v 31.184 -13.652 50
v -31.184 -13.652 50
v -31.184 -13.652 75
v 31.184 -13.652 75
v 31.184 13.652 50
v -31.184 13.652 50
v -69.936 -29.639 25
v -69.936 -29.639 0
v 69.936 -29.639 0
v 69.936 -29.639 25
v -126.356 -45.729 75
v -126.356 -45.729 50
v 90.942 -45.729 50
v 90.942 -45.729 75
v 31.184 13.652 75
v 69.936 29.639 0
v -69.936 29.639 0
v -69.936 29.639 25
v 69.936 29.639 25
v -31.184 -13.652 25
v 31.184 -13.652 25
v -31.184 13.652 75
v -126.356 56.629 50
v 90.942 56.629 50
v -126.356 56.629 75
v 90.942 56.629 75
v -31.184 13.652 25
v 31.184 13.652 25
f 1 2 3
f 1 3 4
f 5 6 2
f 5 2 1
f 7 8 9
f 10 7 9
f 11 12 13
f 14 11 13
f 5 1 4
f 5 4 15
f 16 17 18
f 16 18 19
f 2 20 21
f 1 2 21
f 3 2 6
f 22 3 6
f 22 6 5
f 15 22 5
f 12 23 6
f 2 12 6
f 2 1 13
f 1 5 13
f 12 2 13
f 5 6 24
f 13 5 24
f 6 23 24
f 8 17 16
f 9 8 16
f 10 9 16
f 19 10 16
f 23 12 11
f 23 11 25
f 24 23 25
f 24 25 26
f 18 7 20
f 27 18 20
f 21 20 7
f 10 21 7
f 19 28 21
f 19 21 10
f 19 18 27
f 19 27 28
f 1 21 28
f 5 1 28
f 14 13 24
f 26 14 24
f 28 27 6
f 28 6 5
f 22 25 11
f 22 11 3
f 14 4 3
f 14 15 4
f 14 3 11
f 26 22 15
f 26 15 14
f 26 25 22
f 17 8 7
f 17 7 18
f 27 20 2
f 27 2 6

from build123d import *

# Parameters (mm, degrees)
F0_W     = 139.871492
F0_H     = 59.277482
F1_DEPTH = 25
F2_W     = 62.367704
F2_H     = 27.303834
F3_DEPTH = 25
F4_W     = 217.298236
F4_H     = 102.357833
F4_W_2   = 62.367704
F4_H_2   = 27.303834
F5_DEPTH = 25


with BuildPart() as f1:
    # F0 (on Top) → F1 (new body)
    with BuildSketch(Plane.XY):
        Rectangle(F0_W, F0_H)
    extrude(amount=F1_DEPTH)

    # F2 (on face) → F3 (join)
    with BuildSketch(Plane.XY.offset(25)):
        Rectangle(F2_W, F2_H)
    extrude(amount=F3_DEPTH)


with BuildPart() as f5:
    # F4 (on face) → F5 (new body)
    with BuildSketch(Plane.XY.offset(50)):
        with Locations((-17.706858, 5.449675)):
            Rectangle(F4_W, F4_H)
        Rectangle(F4_W_2, F4_H_2, mode=Mode.SUBTRACT)
    extrude(amount=F5_DEPTH)


solid = Compound([f1.part, f5.part])
